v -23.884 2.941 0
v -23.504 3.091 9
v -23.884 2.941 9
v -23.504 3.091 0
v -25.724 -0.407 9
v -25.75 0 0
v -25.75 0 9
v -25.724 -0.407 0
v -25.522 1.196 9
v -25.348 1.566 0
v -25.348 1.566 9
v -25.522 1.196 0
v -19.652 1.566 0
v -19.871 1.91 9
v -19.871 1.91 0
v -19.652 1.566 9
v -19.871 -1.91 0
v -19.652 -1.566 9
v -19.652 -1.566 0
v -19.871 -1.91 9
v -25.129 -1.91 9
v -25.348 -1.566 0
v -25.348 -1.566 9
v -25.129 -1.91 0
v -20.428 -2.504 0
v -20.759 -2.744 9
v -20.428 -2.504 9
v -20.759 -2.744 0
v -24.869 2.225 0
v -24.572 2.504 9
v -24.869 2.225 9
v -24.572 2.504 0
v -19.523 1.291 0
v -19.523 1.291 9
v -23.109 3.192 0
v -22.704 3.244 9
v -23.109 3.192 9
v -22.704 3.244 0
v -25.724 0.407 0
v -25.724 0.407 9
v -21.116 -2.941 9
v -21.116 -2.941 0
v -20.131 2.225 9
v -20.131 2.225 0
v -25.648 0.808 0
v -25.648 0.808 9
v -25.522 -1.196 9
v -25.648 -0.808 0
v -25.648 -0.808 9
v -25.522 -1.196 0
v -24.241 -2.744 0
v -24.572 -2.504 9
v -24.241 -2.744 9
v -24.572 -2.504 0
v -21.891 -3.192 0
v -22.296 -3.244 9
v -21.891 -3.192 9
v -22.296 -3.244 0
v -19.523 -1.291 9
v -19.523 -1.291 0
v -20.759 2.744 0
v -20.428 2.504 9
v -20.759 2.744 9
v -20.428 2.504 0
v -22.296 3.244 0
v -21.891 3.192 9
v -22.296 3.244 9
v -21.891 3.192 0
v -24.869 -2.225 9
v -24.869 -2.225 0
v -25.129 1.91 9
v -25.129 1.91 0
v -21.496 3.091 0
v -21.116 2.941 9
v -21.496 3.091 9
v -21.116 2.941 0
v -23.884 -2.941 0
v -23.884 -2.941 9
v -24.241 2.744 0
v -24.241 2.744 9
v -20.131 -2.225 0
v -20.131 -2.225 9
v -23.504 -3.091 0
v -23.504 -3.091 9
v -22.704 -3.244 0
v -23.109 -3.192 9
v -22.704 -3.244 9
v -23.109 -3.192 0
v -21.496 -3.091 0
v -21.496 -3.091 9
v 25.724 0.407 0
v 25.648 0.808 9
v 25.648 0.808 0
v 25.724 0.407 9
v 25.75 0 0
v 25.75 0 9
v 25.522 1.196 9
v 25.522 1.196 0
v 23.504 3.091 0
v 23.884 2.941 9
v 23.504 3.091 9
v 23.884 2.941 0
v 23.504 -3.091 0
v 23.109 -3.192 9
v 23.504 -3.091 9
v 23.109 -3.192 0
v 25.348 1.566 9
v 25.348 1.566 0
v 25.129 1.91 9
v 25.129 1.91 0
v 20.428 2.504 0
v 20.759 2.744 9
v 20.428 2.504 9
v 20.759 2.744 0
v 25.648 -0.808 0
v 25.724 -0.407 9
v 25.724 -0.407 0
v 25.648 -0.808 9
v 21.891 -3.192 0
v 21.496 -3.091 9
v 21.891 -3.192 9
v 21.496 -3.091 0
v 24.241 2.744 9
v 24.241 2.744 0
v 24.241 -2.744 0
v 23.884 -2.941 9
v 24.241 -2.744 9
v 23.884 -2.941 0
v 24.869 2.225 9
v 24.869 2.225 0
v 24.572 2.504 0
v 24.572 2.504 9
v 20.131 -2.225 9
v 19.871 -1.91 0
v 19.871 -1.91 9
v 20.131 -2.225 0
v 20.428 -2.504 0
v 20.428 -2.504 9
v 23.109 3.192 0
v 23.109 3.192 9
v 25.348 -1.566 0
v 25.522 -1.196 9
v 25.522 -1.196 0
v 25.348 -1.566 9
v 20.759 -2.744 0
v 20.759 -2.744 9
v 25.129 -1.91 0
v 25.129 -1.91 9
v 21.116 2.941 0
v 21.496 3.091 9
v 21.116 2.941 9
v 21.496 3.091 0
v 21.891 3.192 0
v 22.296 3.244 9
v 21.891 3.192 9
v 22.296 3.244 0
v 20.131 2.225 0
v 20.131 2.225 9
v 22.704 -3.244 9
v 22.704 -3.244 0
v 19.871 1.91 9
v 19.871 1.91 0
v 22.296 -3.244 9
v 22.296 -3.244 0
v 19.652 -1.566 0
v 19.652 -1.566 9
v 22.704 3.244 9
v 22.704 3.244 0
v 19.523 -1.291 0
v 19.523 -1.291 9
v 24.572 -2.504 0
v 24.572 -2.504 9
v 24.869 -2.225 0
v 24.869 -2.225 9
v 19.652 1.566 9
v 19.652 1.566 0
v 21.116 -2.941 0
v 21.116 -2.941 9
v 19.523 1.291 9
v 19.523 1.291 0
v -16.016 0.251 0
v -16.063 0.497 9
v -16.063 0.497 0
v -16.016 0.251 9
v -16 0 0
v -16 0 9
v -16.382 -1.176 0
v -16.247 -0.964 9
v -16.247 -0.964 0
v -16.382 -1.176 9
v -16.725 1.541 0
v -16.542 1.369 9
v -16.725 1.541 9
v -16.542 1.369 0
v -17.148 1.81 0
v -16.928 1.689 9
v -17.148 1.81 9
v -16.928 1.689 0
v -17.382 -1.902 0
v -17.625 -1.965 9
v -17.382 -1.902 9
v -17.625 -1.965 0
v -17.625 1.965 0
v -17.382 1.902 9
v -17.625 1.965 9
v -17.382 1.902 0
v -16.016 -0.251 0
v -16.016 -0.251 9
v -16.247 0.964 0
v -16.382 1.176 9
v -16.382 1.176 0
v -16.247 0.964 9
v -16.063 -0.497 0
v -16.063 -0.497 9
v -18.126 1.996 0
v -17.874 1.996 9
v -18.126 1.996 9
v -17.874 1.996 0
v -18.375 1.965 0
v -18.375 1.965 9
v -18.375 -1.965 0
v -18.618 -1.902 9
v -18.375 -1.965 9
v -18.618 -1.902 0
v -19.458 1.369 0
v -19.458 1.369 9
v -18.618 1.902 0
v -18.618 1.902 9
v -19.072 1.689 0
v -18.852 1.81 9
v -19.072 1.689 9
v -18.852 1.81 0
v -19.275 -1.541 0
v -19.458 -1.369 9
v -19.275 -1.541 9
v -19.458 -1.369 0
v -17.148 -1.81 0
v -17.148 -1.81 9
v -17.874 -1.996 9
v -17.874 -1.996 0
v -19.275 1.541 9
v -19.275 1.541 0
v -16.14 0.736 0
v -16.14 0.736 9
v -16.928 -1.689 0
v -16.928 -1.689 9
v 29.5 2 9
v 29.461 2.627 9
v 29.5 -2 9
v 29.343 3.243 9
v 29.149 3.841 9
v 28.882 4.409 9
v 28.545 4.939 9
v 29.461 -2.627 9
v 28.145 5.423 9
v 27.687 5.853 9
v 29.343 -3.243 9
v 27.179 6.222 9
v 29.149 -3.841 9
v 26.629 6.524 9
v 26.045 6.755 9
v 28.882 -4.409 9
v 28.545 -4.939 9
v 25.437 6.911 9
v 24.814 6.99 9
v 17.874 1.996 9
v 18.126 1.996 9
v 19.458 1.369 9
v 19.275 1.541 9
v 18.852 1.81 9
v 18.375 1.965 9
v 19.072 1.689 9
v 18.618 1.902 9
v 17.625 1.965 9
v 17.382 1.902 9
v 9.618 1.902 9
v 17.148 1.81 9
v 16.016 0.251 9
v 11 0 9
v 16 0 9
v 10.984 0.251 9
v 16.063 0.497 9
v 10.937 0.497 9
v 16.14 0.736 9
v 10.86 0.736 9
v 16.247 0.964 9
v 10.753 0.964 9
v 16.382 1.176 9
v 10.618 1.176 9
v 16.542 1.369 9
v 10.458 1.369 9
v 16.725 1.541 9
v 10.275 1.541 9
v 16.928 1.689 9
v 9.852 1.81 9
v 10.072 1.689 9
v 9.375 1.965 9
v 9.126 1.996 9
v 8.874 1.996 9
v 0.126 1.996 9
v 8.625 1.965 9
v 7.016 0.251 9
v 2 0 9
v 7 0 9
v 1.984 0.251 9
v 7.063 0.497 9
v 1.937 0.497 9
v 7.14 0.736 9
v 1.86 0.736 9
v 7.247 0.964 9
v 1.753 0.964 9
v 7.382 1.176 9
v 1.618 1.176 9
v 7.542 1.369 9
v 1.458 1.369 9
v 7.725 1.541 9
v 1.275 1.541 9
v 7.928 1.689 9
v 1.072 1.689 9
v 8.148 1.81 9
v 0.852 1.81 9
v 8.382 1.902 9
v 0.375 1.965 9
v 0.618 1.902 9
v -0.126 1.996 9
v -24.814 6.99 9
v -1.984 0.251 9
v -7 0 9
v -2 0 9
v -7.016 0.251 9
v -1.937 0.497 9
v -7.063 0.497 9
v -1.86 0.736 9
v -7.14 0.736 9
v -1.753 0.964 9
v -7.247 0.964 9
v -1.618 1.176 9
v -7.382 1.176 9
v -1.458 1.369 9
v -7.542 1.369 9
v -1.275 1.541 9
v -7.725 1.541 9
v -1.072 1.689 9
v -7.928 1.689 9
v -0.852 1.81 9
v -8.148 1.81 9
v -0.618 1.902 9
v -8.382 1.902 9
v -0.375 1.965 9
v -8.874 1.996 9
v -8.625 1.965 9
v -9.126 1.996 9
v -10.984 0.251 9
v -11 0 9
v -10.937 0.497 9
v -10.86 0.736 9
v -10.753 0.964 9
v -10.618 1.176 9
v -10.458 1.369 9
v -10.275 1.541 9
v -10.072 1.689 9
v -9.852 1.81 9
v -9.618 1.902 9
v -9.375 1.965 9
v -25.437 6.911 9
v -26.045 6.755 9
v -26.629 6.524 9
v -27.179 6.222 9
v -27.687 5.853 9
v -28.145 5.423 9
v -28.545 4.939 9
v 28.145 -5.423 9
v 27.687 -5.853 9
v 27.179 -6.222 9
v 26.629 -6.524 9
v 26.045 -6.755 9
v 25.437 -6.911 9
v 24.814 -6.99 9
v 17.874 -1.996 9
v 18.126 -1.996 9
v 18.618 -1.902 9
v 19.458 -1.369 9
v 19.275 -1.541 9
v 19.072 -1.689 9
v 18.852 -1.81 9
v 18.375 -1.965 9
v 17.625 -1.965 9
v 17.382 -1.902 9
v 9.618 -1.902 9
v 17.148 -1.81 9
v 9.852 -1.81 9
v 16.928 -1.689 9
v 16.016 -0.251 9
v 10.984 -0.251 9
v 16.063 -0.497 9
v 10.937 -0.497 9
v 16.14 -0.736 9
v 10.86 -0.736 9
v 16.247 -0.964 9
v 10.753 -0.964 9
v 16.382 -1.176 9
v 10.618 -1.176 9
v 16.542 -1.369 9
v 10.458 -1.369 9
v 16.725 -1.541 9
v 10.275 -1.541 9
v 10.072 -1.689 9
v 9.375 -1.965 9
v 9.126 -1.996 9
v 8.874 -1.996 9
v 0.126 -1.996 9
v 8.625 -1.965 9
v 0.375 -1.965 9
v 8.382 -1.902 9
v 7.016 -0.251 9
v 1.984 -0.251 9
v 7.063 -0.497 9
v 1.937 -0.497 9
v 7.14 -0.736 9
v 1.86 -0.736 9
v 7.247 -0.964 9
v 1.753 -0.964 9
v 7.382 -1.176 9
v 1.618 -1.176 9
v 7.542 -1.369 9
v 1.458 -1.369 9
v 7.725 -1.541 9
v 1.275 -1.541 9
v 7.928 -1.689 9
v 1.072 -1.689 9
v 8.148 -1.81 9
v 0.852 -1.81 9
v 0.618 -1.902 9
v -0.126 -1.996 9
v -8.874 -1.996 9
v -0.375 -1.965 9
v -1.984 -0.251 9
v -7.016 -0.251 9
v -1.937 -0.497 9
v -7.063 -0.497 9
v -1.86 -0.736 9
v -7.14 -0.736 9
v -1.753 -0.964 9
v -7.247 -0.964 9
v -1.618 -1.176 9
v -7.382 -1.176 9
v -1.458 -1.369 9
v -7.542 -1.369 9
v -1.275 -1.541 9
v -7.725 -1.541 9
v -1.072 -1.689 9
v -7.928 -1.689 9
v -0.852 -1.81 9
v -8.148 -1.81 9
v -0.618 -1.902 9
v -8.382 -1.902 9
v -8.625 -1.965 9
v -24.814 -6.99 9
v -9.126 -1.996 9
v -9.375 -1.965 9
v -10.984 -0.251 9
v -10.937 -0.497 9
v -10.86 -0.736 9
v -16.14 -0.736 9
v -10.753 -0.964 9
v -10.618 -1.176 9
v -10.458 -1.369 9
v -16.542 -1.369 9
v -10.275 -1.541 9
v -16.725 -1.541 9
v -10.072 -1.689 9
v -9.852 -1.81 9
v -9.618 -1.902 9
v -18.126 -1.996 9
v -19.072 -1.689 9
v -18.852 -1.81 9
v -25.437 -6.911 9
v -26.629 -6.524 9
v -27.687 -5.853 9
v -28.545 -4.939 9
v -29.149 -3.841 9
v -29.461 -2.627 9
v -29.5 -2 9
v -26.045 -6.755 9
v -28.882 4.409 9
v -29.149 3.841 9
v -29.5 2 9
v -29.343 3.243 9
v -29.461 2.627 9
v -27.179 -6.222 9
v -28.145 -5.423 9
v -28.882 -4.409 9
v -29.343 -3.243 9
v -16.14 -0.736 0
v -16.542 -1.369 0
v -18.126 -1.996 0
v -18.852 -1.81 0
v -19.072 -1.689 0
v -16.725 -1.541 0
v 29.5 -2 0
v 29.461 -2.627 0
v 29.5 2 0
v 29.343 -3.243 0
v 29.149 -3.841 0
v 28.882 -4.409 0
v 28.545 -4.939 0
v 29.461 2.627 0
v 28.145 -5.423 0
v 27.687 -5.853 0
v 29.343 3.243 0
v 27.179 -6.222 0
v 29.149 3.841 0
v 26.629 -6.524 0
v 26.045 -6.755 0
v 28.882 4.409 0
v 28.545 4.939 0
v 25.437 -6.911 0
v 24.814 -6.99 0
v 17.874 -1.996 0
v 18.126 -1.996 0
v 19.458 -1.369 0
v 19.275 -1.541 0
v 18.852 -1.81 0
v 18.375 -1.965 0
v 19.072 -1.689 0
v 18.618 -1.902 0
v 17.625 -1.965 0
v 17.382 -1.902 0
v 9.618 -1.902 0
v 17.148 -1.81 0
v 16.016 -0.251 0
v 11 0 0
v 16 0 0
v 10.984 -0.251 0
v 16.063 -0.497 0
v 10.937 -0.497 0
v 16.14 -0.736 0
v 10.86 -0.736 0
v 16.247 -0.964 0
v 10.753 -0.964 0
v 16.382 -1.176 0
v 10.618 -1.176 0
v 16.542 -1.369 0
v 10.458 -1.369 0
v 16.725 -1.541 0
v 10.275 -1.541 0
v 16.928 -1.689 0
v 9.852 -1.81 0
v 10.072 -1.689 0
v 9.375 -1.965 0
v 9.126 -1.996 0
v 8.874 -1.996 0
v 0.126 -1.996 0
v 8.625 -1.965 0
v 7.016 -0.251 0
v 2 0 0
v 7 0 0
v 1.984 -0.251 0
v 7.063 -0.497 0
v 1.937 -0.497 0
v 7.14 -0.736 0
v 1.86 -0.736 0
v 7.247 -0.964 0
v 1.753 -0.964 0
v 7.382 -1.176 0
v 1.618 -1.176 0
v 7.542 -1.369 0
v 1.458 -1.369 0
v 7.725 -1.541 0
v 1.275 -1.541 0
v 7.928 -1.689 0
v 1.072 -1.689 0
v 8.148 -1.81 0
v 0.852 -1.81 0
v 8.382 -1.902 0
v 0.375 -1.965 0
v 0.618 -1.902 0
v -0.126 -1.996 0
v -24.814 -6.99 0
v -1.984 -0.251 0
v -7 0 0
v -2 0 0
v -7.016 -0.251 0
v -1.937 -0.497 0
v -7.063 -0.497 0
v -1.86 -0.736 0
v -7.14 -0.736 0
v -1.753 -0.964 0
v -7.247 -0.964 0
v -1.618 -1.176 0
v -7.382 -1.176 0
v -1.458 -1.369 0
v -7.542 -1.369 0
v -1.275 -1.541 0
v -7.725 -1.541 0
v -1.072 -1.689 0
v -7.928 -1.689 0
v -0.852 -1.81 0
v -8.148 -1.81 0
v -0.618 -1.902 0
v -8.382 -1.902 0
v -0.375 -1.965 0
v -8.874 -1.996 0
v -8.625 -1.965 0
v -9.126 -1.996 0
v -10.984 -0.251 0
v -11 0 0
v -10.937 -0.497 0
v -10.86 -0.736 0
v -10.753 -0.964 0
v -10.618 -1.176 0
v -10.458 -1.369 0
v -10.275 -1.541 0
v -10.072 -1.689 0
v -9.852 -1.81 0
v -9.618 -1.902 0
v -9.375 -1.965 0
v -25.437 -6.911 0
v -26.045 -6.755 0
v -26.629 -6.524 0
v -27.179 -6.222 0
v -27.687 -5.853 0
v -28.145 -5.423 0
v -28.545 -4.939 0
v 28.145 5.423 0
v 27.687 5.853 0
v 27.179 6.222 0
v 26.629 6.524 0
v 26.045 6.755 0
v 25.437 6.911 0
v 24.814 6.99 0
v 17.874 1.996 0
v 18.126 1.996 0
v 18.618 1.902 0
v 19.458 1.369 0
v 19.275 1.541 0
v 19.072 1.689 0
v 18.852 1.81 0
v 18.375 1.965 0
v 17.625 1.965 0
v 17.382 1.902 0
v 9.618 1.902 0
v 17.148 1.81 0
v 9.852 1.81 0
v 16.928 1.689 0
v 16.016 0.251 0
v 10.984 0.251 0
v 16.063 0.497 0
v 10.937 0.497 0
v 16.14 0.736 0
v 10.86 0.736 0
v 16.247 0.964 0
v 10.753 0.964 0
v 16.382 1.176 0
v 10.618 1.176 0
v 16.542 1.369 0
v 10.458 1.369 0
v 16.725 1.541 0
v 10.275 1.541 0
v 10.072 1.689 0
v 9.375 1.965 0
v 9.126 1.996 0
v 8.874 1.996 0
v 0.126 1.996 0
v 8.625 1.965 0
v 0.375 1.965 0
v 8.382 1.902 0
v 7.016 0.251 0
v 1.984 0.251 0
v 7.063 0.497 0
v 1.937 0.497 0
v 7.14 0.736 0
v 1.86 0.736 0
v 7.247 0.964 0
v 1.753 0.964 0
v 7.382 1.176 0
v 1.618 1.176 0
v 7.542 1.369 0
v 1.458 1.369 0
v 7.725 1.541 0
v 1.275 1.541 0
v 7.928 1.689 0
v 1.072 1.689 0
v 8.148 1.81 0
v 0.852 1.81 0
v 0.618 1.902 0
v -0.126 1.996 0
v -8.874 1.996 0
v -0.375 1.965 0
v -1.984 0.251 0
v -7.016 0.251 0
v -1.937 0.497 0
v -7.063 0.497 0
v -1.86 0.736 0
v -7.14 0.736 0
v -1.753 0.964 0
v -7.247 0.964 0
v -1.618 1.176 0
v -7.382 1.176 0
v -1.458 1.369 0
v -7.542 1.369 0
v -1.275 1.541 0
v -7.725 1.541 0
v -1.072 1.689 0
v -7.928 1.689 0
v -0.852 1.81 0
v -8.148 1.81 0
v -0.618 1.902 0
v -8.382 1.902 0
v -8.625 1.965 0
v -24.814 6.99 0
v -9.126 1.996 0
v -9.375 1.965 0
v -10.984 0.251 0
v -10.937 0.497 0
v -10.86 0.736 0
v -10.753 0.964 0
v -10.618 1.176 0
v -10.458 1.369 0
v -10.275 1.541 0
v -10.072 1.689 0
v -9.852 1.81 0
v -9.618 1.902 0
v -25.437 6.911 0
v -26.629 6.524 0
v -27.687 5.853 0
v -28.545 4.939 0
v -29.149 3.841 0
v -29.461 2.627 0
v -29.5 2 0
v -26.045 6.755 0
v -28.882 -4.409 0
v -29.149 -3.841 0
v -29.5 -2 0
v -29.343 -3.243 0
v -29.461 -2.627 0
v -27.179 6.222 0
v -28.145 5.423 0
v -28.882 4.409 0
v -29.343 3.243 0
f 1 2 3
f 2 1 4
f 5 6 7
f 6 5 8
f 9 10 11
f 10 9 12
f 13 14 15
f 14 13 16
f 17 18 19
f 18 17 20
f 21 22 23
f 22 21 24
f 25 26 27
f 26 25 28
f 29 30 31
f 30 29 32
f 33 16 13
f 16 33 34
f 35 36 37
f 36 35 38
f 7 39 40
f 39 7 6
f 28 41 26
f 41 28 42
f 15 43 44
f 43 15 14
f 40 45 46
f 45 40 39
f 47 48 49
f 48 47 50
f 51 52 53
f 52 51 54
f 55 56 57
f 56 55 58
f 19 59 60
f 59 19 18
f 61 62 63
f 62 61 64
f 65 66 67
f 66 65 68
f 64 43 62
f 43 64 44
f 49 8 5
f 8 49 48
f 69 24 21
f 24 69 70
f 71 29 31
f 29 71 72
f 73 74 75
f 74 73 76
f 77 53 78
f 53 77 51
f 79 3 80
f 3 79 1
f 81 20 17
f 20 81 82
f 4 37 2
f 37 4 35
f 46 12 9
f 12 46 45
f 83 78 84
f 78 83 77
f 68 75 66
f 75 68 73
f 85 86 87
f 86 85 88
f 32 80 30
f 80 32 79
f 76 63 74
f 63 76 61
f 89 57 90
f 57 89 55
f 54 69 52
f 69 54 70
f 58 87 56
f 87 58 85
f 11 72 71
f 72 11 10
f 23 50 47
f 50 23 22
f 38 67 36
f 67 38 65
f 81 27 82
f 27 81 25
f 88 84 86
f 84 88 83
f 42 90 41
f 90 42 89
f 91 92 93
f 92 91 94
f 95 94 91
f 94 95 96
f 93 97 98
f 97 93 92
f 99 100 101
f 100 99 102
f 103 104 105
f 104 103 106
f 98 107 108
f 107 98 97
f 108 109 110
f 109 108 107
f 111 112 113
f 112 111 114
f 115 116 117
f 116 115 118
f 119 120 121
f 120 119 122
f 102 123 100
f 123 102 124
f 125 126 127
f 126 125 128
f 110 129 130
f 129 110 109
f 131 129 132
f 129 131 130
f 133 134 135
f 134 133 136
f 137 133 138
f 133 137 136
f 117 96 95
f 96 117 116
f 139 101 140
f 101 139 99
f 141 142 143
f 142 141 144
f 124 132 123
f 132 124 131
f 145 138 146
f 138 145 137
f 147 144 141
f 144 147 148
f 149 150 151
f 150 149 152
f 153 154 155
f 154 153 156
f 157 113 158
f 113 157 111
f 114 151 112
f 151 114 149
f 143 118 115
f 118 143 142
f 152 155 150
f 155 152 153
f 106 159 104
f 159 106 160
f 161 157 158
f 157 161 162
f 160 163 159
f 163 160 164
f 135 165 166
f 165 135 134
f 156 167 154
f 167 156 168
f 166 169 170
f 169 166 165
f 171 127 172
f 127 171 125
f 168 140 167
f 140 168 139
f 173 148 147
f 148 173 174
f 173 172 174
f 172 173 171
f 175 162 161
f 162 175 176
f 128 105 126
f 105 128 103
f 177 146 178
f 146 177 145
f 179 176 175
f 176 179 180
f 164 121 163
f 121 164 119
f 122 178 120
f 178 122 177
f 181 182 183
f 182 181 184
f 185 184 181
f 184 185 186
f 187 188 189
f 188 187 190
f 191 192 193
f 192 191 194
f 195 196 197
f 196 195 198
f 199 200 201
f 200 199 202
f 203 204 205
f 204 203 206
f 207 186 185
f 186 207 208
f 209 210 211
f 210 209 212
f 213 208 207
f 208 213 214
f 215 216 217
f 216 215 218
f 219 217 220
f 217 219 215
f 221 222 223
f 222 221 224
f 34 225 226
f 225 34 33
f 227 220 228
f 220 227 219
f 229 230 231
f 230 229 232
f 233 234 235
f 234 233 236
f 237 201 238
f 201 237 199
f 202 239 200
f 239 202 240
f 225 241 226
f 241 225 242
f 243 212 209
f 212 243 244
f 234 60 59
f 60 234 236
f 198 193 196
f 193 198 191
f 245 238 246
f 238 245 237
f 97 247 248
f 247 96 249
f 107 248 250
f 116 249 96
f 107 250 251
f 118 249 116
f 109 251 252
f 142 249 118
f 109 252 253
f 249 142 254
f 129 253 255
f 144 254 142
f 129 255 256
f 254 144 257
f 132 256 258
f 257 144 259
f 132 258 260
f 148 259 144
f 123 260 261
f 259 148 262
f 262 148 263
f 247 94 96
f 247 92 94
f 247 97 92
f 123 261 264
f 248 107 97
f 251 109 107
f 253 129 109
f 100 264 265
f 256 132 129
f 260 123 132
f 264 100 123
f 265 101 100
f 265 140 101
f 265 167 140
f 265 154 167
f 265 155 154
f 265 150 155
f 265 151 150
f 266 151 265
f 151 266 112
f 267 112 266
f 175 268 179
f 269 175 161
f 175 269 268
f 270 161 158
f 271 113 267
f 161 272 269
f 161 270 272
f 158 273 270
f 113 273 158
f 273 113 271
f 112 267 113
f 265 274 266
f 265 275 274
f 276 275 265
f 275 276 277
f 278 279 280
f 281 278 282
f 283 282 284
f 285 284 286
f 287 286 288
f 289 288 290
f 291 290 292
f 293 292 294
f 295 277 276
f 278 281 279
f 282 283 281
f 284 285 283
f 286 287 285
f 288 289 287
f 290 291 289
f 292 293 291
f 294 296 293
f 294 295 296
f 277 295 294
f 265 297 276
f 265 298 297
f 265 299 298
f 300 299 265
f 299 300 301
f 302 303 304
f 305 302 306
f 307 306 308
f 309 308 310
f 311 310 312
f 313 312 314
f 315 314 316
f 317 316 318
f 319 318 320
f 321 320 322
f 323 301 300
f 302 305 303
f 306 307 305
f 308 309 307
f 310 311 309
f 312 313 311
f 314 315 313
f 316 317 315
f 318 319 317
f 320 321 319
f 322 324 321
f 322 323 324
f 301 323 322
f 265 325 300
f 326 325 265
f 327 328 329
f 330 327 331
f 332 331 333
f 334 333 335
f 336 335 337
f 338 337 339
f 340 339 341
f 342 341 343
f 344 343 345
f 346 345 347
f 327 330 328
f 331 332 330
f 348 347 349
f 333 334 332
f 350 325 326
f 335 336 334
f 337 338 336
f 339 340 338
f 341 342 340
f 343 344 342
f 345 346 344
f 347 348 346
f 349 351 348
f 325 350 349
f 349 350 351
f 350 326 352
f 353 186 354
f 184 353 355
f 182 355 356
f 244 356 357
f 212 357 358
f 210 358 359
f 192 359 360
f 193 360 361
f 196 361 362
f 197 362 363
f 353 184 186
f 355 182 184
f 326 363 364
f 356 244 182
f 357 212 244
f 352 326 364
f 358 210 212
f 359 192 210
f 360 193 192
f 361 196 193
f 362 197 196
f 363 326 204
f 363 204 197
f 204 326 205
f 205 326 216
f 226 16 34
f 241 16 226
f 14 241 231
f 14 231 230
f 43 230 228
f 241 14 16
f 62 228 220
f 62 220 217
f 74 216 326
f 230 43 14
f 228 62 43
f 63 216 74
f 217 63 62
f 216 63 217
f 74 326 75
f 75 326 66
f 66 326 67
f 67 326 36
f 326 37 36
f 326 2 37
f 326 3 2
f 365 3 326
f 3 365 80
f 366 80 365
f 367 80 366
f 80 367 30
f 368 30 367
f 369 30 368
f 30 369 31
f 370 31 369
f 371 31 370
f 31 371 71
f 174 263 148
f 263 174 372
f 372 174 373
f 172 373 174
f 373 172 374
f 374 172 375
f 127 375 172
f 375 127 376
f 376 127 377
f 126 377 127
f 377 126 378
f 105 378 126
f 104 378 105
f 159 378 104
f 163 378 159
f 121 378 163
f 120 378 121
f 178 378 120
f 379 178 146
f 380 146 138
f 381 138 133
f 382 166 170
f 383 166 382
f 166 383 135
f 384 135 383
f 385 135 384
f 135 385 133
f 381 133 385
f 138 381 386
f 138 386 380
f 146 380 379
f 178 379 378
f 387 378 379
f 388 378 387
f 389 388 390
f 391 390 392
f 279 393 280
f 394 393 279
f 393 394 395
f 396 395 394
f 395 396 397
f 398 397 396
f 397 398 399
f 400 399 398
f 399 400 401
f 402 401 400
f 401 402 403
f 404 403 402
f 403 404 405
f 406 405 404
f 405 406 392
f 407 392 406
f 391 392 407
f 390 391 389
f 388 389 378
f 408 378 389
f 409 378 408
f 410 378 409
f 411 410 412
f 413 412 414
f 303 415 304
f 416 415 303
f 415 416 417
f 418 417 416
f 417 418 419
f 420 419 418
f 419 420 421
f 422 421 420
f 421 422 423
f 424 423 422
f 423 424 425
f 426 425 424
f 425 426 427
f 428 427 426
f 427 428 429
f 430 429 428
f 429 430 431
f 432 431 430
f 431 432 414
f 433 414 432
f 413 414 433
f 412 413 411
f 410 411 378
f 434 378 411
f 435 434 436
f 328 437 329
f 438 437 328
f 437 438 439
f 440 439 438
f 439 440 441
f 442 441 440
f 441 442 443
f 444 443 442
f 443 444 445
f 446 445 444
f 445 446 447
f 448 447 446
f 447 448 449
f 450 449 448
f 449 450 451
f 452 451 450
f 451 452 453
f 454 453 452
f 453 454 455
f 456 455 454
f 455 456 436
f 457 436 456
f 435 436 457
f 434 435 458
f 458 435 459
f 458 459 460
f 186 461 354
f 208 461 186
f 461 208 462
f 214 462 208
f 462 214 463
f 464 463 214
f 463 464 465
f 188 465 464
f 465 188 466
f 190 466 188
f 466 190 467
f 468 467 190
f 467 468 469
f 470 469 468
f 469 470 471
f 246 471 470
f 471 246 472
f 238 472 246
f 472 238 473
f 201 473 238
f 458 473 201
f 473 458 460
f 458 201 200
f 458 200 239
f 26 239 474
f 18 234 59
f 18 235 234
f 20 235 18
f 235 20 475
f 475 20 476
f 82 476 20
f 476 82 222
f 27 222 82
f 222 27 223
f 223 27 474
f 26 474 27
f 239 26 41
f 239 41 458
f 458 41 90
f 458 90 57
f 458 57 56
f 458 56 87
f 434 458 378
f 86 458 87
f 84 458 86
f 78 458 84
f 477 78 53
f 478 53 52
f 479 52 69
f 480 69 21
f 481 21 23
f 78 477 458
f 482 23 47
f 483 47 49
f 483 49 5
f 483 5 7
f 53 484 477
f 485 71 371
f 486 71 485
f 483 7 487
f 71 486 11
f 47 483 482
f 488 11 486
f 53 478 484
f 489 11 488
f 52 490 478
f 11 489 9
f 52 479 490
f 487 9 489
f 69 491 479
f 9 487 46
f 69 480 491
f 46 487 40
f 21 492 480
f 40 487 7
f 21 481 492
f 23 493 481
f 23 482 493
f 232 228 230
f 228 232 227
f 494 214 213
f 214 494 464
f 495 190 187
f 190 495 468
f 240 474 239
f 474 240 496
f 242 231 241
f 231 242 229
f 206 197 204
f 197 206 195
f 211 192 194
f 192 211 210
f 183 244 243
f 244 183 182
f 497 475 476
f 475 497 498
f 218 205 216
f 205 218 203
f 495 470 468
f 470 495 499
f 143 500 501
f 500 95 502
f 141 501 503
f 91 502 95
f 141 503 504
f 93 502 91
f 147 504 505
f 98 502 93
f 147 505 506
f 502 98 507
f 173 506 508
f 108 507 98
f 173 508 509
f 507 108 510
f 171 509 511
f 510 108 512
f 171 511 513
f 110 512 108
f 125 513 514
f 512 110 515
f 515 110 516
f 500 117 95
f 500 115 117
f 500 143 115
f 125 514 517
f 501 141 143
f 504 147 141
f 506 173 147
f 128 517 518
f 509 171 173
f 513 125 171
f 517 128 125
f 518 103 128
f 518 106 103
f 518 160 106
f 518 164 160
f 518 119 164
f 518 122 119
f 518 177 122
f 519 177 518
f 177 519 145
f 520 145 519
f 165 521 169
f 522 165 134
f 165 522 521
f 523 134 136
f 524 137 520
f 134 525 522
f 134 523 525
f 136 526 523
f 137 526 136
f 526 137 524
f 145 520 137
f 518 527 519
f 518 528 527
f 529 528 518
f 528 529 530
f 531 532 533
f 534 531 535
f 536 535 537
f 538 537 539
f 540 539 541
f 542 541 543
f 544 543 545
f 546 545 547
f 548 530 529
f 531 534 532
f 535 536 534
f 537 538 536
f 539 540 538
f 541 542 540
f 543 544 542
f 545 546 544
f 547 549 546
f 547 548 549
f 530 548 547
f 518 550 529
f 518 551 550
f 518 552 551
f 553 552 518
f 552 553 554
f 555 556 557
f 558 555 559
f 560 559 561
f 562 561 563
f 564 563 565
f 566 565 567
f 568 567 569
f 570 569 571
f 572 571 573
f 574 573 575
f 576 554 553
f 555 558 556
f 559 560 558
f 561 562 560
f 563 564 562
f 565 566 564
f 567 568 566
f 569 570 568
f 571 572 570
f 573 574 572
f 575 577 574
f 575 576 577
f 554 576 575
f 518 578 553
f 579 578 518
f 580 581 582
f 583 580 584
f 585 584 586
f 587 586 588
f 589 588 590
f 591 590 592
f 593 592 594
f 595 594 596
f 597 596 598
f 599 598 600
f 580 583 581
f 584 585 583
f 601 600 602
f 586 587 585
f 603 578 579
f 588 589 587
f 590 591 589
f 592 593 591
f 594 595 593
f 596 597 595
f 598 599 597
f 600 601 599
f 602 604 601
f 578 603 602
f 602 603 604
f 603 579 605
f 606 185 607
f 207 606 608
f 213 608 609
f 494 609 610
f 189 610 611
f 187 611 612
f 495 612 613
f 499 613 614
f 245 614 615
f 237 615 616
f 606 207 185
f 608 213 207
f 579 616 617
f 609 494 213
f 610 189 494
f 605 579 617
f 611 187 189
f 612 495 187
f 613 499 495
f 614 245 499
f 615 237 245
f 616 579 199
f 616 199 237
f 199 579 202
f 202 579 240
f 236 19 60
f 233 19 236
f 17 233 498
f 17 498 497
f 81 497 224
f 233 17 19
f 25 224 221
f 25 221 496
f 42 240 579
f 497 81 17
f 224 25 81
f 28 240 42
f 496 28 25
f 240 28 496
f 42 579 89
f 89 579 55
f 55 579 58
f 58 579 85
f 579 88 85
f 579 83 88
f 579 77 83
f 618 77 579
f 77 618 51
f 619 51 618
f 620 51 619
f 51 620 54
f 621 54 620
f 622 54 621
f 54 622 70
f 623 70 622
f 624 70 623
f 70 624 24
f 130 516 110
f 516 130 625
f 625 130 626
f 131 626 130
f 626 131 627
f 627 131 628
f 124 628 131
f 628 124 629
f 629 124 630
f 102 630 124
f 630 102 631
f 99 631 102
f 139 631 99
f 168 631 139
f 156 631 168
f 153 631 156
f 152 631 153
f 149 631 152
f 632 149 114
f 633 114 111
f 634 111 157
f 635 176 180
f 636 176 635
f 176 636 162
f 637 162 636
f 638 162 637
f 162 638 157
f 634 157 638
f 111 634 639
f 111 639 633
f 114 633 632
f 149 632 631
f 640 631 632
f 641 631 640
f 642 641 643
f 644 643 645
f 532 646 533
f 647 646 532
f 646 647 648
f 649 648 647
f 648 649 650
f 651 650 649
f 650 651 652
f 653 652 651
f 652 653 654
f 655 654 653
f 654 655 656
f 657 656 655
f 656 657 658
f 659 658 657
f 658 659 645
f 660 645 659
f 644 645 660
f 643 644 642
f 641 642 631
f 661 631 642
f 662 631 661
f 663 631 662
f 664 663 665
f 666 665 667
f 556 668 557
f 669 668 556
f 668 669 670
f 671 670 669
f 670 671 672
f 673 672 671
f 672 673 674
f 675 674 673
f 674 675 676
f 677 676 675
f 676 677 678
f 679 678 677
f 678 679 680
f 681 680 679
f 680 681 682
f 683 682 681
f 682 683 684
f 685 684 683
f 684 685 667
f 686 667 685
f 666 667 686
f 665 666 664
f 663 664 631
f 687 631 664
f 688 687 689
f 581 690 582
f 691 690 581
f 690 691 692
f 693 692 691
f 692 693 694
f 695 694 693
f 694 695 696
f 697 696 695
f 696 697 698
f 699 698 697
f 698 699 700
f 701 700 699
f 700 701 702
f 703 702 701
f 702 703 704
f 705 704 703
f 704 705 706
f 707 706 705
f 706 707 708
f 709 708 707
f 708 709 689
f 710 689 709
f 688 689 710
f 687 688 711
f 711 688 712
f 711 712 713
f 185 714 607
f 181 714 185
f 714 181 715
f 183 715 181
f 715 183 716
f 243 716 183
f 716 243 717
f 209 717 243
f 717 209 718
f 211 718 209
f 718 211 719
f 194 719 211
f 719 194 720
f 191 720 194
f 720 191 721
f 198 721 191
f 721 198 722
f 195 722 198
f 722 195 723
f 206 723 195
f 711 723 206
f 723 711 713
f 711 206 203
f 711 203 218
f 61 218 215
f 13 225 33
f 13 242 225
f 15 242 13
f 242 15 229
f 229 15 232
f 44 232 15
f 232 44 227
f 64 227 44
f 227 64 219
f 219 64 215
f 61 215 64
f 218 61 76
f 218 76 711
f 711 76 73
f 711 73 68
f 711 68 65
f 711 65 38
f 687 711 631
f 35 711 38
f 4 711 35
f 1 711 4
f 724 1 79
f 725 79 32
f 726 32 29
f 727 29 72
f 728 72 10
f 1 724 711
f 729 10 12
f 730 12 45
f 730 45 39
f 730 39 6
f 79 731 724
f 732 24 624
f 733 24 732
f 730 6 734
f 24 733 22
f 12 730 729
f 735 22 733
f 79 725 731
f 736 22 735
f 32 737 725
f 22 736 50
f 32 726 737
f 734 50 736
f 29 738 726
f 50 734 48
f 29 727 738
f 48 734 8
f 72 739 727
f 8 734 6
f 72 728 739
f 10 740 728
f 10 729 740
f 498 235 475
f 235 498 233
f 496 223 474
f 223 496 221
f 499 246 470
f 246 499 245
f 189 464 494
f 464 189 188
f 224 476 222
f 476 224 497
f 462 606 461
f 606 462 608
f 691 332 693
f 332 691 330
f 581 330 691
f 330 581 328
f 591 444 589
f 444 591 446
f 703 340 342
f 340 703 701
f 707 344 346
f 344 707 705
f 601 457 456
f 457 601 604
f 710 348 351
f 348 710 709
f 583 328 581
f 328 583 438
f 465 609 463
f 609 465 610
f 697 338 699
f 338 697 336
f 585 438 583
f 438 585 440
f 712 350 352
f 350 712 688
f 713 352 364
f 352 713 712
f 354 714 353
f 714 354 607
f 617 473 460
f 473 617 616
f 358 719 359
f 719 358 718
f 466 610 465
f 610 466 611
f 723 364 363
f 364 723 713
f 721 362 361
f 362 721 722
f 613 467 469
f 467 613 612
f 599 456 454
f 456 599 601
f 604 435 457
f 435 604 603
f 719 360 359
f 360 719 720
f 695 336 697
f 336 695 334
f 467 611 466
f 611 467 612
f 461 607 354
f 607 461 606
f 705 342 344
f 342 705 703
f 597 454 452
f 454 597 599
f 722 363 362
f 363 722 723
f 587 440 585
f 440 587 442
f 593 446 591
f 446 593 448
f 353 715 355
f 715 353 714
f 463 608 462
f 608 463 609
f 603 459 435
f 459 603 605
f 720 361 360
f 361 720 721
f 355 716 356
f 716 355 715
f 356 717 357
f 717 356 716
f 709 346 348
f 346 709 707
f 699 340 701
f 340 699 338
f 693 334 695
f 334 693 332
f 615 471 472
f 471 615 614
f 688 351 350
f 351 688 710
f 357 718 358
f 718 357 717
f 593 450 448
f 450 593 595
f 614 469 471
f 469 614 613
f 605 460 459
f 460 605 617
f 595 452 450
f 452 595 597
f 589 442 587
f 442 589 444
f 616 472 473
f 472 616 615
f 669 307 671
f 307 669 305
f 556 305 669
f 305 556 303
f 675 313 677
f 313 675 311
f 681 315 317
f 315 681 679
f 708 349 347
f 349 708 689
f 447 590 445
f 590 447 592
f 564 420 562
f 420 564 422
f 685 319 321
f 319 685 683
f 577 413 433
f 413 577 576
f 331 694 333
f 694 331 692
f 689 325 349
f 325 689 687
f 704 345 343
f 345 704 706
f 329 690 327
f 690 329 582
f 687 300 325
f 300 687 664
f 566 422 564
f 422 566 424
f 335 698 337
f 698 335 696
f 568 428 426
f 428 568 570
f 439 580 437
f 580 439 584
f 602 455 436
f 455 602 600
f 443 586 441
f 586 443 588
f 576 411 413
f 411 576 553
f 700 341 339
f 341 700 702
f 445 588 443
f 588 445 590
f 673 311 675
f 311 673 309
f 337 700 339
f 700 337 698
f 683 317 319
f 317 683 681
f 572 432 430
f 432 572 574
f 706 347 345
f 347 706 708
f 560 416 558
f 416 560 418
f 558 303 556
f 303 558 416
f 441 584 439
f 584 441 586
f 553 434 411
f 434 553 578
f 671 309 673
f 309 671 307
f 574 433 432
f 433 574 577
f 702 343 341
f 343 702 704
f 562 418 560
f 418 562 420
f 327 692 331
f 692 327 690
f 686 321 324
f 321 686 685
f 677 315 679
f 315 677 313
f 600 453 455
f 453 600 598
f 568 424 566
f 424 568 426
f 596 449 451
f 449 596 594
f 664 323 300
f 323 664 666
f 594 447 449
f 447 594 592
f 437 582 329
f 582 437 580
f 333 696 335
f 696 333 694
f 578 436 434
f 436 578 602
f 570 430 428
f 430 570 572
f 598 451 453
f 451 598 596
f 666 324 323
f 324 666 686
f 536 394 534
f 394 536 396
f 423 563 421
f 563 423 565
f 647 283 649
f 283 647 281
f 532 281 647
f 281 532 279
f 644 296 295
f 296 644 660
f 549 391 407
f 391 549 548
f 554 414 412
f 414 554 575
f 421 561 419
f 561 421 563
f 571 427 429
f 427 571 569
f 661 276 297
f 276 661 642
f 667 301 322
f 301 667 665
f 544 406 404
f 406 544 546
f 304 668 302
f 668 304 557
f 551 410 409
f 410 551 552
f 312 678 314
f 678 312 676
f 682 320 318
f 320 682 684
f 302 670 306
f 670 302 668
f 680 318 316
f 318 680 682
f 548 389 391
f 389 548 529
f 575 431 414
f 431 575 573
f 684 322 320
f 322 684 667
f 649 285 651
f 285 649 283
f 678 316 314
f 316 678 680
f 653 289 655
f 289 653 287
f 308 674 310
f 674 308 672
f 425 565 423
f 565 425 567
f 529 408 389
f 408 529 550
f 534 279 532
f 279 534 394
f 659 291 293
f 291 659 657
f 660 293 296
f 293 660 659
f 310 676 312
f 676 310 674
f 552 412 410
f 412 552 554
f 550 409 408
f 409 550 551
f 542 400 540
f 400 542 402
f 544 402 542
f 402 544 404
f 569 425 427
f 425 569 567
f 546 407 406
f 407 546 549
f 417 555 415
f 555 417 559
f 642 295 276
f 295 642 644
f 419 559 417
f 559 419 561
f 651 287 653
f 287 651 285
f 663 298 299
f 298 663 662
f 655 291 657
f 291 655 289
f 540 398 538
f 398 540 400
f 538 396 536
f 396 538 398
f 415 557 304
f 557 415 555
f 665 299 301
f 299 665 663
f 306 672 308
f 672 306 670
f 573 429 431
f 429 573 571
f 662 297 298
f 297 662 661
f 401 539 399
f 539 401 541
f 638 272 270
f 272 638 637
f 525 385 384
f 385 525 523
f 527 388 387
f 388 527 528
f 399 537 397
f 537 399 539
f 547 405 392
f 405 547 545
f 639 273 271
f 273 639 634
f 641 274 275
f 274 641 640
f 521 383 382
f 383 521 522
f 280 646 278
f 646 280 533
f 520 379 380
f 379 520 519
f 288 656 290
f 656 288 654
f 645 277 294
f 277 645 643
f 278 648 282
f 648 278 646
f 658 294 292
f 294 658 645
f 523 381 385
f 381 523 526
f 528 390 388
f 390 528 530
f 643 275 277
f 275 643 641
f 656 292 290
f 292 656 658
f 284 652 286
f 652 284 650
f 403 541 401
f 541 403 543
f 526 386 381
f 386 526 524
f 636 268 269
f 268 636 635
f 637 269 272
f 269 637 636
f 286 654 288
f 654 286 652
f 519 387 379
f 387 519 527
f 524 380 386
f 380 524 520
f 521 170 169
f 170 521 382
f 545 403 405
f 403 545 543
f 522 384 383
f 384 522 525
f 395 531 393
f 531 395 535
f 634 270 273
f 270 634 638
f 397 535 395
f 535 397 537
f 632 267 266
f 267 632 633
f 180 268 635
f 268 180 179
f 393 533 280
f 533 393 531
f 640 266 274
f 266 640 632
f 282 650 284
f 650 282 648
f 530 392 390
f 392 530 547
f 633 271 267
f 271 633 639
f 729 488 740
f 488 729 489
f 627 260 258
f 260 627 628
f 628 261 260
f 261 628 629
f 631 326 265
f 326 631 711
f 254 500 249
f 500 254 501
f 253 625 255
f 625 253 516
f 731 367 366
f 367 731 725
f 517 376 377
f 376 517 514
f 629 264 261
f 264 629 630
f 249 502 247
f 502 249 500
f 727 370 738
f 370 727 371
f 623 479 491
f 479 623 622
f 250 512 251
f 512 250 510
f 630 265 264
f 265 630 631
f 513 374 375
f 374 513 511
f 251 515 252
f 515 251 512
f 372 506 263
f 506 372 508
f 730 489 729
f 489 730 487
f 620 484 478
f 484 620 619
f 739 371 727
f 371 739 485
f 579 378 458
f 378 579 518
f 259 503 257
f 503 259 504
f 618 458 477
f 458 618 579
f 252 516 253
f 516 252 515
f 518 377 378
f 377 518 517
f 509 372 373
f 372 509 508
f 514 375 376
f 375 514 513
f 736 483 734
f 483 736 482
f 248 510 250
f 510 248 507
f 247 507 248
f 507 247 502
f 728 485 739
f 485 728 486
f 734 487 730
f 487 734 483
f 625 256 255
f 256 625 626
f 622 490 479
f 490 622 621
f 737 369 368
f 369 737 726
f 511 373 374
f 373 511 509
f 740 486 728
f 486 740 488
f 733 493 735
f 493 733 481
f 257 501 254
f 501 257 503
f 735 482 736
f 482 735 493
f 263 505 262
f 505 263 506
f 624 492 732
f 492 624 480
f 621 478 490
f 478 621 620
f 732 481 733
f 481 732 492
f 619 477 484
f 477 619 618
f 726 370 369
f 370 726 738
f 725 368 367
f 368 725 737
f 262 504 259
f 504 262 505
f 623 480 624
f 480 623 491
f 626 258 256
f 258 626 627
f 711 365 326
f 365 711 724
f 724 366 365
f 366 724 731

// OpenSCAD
$fn = 50;


difference() {
	union() {
		hull() {
			translate(v = [-24.5000000000, 2.0000000000, 0]) {
				cylinder(h = 9, r = 5);
			}
			translate(v = [24.5000000000, 2.0000000000, 0]) {
				cylinder(h = 9, r = 5);
			}
			translate(v = [-24.5000000000, -2.0000000000, 0]) {
				cylinder(h = 9, r = 5);
			}
			translate(v = [24.5000000000, -2.0000000000, 0]) {
				cylinder(h = 9, r = 5);
			}
		}
	}
	union() {
		#translate(v = [-22.5000000000, 0.0000000000, -100.0000000000]) {
			cylinder(h = 200, r = 3.2500000000);
		}
		#translate(v = [-22.5000000000, 0.0000000000, -100.0000000000]) {
			cylinder(h = 200, r = 3.2500000000);
		}
		#translate(v = [22.5000000000, 0.0000000000, -100.0000000000]) {
			cylinder(h = 200, r = 3.2500000000);
		}
		#translate(v = [22.5000000000, 0.0000000000, -100.0000000000]) {
			cylinder(h = 200, r = 3.2500000000);
		}
		#translate(v = [-18.0000000000, 0, 0]) {
			cylinder(h = 9, r = 2.0000000000);
		}
		#translate(v = [-9.0000000000, 0, 0]) {
			cylinder(h = 9, r = 2.0000000000);
		}
		#cylinder(h = 9, r = 2.0000000000);
		#translate(v = [9.0000000000, 0, 0]) {
			cylinder(h = 9, r = 2.0000000000);
		}
		#translate(v = [18.0000000000, 0, 0]) {
			cylinder(h = 9, r = 2.0000000000);
		}
	}
}
